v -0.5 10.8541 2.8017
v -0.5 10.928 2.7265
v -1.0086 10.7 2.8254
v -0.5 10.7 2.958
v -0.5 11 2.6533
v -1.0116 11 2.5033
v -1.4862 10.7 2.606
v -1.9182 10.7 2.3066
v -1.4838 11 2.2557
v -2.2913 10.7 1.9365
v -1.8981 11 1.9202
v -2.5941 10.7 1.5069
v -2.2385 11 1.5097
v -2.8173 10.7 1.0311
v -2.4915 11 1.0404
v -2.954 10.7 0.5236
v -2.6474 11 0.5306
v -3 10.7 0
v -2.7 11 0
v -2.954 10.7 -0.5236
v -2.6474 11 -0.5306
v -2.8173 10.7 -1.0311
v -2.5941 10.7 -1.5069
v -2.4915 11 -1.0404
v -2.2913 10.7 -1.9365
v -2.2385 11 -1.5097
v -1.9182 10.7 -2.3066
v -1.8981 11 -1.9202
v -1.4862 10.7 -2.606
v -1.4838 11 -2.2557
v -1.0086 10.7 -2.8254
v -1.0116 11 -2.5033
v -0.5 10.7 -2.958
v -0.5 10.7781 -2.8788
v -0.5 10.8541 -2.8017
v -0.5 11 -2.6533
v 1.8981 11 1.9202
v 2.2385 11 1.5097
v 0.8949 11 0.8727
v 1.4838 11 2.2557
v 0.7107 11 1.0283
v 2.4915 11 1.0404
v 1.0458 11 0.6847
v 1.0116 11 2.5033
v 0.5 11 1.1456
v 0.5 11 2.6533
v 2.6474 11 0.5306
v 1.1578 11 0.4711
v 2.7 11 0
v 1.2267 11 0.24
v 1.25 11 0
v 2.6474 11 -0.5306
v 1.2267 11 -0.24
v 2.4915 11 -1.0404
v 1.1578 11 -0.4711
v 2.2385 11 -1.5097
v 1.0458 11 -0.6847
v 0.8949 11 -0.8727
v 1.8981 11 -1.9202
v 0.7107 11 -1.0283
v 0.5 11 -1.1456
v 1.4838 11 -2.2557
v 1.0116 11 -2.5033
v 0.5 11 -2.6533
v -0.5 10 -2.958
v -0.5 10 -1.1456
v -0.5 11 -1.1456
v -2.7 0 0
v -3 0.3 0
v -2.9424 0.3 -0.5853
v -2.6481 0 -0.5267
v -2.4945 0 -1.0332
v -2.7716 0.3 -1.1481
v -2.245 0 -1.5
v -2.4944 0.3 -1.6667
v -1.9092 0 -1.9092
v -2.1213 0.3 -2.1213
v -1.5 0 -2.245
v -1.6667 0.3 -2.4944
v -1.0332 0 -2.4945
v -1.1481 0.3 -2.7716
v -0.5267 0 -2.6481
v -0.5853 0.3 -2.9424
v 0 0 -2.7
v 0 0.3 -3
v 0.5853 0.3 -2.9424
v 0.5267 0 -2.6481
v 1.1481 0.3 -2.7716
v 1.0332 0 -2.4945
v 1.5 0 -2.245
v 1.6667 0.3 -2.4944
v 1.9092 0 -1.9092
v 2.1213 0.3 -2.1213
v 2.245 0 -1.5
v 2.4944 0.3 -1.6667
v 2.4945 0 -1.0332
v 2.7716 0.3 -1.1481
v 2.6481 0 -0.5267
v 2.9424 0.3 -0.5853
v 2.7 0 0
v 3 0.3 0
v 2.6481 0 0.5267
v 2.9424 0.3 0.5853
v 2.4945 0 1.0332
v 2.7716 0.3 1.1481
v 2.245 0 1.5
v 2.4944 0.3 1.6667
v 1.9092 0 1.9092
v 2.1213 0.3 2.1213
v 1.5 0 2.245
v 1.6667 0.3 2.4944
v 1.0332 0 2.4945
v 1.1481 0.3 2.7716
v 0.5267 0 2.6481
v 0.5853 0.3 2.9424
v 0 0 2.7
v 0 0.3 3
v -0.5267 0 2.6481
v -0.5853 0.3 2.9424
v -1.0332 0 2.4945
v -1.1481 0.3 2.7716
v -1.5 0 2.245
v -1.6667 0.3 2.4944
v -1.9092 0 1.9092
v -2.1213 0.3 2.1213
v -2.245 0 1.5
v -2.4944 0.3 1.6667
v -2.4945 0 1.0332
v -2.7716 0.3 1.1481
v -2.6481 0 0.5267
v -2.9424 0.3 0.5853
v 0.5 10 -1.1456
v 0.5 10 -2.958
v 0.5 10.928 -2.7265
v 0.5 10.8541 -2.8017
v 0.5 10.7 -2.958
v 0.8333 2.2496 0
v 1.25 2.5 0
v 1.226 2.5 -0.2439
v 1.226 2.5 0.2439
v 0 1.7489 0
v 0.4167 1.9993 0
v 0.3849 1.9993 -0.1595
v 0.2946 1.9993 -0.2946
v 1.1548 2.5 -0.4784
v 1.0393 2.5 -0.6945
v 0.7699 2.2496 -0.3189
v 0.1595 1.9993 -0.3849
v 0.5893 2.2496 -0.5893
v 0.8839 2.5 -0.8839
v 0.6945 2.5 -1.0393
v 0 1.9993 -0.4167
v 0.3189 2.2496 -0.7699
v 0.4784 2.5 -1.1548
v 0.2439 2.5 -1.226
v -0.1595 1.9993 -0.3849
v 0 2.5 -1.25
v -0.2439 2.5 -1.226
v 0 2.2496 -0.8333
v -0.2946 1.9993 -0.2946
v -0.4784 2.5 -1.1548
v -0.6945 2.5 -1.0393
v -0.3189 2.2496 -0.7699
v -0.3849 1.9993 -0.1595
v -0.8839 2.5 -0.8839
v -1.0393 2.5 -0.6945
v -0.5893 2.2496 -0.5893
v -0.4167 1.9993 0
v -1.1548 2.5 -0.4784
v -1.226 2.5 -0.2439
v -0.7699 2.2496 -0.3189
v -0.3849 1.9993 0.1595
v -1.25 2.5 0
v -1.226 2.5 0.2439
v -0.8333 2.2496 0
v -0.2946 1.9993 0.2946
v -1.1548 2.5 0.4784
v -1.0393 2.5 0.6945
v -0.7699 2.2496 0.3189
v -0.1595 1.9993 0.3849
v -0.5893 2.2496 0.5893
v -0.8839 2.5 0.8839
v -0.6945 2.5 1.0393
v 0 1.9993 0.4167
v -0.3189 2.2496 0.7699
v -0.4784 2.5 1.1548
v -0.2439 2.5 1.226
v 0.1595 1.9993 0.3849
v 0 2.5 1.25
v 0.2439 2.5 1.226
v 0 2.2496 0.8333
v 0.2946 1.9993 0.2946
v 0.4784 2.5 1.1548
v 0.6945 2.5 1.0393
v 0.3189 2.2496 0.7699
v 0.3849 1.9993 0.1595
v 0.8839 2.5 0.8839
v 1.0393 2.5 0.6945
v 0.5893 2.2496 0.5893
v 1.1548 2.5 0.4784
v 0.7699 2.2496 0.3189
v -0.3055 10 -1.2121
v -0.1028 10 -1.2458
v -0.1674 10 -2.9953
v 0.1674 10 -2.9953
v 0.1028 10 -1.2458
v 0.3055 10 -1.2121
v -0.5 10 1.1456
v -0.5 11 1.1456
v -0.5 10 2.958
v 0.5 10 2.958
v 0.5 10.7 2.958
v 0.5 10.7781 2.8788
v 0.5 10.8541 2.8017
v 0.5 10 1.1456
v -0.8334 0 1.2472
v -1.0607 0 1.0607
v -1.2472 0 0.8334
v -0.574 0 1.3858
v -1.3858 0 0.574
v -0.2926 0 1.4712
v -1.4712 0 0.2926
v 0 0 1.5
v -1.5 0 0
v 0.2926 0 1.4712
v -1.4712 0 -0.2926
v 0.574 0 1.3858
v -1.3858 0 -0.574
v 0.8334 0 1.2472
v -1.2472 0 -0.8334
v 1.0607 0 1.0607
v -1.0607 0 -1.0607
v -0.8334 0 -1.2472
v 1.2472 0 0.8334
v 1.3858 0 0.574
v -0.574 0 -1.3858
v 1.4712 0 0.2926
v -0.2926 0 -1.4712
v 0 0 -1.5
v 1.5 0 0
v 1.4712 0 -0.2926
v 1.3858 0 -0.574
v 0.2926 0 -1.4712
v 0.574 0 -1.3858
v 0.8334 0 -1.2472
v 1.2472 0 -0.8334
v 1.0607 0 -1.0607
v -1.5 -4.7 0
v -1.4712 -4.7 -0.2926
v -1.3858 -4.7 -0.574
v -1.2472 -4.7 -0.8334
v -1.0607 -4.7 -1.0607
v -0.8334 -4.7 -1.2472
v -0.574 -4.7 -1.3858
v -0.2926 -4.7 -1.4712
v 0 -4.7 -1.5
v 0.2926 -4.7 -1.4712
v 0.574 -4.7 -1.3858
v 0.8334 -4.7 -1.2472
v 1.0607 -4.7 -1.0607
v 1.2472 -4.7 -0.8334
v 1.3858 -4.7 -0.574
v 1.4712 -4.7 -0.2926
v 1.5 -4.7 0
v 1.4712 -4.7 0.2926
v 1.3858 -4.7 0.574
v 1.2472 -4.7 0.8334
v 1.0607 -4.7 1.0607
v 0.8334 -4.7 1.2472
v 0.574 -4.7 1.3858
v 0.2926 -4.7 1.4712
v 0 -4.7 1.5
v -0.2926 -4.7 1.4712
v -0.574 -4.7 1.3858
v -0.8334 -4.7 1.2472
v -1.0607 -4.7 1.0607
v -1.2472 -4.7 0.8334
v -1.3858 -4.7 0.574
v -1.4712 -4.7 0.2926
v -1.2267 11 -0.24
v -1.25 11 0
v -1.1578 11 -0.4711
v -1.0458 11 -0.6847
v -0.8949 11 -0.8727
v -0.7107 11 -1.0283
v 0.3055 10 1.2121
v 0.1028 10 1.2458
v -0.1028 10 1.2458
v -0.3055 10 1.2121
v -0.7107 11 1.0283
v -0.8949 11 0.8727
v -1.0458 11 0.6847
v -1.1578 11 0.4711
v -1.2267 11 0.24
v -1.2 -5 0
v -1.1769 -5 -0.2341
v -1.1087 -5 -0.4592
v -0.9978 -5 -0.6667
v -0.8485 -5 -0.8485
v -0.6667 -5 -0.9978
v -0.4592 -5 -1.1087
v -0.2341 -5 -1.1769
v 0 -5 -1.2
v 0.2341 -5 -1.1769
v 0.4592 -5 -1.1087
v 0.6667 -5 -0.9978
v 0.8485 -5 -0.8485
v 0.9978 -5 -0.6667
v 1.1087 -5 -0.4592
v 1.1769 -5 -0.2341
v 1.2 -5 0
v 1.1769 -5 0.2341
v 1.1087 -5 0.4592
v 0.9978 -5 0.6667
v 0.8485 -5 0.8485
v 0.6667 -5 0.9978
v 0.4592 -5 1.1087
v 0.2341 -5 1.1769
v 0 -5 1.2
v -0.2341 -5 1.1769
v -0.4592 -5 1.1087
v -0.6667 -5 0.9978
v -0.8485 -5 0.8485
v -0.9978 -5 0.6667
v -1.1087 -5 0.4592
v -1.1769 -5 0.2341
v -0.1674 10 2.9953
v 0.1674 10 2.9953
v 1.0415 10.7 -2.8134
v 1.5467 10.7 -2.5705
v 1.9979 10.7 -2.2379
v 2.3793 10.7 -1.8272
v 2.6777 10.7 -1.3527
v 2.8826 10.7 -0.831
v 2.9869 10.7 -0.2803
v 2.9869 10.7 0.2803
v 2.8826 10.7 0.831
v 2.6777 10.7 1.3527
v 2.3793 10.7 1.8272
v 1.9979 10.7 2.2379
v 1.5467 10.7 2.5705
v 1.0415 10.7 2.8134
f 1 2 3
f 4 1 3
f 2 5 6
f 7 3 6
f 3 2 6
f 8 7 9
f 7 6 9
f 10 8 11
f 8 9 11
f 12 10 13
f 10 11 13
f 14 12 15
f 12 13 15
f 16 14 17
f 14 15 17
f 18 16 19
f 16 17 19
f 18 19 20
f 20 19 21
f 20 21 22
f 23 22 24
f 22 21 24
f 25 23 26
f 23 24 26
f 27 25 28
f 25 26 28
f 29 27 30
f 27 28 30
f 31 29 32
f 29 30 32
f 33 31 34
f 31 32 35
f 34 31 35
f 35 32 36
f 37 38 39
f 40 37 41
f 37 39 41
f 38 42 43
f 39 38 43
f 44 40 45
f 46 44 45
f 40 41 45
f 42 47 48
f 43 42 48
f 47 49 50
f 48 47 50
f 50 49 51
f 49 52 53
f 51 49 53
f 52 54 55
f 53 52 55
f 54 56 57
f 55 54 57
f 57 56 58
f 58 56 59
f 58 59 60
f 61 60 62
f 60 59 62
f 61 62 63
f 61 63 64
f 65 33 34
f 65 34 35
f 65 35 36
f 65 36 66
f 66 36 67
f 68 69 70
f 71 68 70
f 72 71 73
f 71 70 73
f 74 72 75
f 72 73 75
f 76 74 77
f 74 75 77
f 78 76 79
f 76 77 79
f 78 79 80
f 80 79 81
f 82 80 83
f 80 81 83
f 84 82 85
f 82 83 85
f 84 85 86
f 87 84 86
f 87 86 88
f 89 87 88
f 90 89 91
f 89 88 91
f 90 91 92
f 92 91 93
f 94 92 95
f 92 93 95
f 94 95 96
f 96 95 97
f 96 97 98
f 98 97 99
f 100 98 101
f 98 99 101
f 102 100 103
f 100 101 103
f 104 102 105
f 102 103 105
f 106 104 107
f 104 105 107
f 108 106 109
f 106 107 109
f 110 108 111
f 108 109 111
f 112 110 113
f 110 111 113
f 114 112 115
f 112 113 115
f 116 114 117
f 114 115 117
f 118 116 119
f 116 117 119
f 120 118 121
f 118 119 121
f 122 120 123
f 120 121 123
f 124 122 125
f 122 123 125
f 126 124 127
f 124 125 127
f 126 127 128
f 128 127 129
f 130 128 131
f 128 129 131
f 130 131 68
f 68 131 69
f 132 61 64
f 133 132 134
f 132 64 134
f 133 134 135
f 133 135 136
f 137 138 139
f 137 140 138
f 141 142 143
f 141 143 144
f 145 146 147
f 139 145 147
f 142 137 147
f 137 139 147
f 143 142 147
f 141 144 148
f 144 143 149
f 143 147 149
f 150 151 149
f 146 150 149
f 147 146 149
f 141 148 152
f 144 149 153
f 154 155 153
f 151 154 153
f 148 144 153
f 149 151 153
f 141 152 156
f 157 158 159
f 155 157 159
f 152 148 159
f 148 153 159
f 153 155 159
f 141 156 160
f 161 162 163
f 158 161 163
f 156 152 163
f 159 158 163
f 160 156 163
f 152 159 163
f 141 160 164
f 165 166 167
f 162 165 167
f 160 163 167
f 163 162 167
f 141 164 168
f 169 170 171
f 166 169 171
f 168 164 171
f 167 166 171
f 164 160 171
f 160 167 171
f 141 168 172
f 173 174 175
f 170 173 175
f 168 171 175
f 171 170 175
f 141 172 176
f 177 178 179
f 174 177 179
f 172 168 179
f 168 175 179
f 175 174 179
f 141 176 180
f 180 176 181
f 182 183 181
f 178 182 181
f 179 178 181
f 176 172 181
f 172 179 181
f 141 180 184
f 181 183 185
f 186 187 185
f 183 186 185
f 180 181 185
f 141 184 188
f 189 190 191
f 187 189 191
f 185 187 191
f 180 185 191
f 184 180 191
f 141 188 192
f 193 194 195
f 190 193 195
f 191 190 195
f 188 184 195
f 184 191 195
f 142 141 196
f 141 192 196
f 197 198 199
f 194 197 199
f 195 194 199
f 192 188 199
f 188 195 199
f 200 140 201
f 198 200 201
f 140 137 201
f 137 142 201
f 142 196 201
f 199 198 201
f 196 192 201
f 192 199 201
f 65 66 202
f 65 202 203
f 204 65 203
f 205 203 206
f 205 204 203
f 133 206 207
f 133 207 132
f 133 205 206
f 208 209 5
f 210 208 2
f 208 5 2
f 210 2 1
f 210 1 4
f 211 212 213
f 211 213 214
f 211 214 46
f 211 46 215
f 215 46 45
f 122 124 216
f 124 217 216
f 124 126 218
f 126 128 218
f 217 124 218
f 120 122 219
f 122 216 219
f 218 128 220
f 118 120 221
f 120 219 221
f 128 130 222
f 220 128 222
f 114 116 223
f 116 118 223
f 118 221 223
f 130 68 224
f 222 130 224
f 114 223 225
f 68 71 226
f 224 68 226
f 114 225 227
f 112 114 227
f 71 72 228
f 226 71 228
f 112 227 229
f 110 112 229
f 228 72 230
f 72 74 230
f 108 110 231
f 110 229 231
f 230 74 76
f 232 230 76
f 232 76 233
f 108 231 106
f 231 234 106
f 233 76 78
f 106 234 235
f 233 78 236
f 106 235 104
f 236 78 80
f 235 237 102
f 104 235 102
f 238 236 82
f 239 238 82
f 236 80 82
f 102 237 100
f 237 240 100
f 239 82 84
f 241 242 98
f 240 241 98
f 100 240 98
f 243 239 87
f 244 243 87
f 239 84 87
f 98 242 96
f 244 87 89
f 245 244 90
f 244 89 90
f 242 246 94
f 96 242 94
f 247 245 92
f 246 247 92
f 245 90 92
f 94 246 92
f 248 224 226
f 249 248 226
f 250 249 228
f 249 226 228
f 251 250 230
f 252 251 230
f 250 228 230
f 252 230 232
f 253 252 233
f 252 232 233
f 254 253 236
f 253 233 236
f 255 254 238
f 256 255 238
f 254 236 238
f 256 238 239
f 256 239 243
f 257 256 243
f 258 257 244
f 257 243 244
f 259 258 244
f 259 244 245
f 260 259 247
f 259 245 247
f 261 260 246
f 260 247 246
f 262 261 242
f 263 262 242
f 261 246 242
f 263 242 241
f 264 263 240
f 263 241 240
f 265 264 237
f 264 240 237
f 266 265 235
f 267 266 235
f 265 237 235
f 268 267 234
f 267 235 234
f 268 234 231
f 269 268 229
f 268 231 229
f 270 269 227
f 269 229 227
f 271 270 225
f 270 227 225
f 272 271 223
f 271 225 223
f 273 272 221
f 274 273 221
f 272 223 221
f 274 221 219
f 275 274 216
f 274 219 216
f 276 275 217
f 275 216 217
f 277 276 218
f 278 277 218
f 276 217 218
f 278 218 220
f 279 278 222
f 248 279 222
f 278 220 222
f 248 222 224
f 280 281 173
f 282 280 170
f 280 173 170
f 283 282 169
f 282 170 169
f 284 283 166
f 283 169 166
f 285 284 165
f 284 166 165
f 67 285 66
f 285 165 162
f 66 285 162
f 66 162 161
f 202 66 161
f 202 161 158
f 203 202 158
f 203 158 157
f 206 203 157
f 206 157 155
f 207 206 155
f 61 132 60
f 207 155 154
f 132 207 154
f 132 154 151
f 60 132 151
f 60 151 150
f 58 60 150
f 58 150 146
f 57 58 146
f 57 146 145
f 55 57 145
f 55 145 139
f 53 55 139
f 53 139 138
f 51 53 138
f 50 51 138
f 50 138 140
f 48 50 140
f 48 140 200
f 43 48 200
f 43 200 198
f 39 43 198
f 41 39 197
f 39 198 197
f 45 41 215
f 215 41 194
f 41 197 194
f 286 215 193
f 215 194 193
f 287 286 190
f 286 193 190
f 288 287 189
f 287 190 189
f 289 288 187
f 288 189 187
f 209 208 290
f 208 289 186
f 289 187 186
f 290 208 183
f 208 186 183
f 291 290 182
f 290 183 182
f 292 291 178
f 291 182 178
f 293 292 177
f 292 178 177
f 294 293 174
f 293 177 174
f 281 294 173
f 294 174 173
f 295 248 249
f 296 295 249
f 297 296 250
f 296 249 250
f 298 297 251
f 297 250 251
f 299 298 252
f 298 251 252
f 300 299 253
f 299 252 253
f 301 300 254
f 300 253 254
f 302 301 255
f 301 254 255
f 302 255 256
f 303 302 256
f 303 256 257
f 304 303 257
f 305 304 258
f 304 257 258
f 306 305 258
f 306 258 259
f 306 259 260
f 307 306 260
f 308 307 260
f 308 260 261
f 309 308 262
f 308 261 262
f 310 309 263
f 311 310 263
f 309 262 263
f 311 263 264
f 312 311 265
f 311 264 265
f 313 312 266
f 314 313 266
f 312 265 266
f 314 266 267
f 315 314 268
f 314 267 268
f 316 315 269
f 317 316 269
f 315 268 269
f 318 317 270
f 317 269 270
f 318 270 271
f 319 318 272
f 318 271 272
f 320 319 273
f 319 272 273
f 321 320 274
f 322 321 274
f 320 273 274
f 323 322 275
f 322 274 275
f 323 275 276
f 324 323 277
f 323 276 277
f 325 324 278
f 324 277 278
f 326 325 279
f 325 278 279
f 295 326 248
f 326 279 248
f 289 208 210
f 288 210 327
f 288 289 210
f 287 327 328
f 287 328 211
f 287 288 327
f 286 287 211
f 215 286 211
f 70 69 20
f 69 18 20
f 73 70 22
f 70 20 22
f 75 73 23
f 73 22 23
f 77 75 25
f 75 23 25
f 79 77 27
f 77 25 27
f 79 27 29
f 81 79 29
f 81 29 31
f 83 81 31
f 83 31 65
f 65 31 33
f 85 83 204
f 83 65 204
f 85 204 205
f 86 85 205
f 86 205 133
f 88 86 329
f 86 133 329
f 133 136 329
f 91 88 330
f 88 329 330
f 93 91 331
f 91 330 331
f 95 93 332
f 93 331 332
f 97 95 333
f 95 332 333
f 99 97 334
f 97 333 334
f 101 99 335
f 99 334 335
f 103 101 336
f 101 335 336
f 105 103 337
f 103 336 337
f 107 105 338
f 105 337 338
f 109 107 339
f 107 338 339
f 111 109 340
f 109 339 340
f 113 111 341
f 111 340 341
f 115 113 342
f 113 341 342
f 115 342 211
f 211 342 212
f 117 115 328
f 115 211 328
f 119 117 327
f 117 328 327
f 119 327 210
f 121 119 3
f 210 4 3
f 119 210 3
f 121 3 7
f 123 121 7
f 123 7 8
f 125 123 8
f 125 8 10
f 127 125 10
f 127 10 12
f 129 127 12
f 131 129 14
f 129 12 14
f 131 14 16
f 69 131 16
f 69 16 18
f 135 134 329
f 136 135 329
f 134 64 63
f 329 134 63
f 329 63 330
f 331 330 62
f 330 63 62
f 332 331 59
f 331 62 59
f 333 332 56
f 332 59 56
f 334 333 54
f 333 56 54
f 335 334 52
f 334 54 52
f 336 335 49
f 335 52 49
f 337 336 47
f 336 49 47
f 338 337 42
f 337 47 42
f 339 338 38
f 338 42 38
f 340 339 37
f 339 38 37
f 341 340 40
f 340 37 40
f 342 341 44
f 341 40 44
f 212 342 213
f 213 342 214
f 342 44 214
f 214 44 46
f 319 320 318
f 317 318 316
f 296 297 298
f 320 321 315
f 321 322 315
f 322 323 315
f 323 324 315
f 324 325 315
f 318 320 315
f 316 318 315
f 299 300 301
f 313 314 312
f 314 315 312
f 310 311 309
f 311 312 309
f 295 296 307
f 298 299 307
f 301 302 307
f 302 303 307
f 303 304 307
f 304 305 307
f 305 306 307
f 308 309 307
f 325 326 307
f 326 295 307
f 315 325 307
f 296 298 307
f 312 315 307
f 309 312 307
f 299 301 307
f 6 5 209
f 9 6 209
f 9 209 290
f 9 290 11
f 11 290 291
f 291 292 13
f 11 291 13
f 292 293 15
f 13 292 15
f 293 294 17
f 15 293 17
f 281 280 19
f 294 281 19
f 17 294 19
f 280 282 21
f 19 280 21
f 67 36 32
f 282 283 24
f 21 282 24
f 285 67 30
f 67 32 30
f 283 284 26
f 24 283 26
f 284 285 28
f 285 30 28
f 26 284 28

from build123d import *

# Parameters (mm, degrees)
CHAMFER_1_SIZE         = 0.3
CUT_EXTRUDE_2_DEPTH    = 1
HOLE_WIZARD_M3_1_D     = 2.5
HOLE_WIZARD_M3_1_DEPTH = 8.5
HOLE_WIZARD_M3_1_TIP   = 0.751075774


with BuildPart() as part:
    # ｽｹｯﾁ1 → 回転1 (revolve)
    with BuildSketch(Plane.XY):
        Polygon((0, -5), (-1.5, -5), (-1.5, 0), (-3, 0), (-3, 11), (0, 11), align=None)
    revolve(axis=Axis((0, 16.004822162, 0), (0, -1, 0)))

    # 面取り1
    chamfer_1_edges = [part.edges().sort_by_distance(p)[0] for p in [
        (3, 11, 0),
        (3, 0, 0),
        (1.5, -5, 0),
    ]]
    chamfer(chamfer_1_edges, length=CHAMFER_1_SIZE)

    # ｽｹｯﾁ2 → ｶｯﾄ - 押し出し2 (cut)
    with BuildSketch(Plane(origin=(0, 11, 0), x_dir=(1, 0, 0), z_dir=(0, 1, 0))):
        with BuildLine():
            Line((0.5, -2.958039892), (0.5, 2.958039892))
            ThreePointArc((0.5, 2.958039892), (0, 3), (-0.5, 2.958039892))
            Line((-0.5, 2.958039892), (-0.5, -2.958039892))
            ThreePointArc((-0.5, -2.958039892), (0, -3), (0.5, -2.958039892))
        make_face()
    extrude(amount=-CUT_EXTRUDE_2_DEPTH, mode=Mode.SUBTRACT)

    # M3 ねじ穴1
    with Locations(Plane(origin=(0, 11, 0), x_dir=(1, 0, 0), z_dir=(0, 1, 0))):
        with Locations((0, 0)):
            Hole(HOLE_WIZARD_M3_1_D / 2, depth=HOLE_WIZARD_M3_1_DEPTH)
            with Locations((0, 0, -(HOLE_WIZARD_M3_1_DEPTH + HOLE_WIZARD_M3_1_TIP / 2))):  # 118° drill point
                Cone(0, HOLE_WIZARD_M3_1_D / 2, HOLE_WIZARD_M3_1_TIP, mode=Mode.SUBTRACT)


solid = part.part
